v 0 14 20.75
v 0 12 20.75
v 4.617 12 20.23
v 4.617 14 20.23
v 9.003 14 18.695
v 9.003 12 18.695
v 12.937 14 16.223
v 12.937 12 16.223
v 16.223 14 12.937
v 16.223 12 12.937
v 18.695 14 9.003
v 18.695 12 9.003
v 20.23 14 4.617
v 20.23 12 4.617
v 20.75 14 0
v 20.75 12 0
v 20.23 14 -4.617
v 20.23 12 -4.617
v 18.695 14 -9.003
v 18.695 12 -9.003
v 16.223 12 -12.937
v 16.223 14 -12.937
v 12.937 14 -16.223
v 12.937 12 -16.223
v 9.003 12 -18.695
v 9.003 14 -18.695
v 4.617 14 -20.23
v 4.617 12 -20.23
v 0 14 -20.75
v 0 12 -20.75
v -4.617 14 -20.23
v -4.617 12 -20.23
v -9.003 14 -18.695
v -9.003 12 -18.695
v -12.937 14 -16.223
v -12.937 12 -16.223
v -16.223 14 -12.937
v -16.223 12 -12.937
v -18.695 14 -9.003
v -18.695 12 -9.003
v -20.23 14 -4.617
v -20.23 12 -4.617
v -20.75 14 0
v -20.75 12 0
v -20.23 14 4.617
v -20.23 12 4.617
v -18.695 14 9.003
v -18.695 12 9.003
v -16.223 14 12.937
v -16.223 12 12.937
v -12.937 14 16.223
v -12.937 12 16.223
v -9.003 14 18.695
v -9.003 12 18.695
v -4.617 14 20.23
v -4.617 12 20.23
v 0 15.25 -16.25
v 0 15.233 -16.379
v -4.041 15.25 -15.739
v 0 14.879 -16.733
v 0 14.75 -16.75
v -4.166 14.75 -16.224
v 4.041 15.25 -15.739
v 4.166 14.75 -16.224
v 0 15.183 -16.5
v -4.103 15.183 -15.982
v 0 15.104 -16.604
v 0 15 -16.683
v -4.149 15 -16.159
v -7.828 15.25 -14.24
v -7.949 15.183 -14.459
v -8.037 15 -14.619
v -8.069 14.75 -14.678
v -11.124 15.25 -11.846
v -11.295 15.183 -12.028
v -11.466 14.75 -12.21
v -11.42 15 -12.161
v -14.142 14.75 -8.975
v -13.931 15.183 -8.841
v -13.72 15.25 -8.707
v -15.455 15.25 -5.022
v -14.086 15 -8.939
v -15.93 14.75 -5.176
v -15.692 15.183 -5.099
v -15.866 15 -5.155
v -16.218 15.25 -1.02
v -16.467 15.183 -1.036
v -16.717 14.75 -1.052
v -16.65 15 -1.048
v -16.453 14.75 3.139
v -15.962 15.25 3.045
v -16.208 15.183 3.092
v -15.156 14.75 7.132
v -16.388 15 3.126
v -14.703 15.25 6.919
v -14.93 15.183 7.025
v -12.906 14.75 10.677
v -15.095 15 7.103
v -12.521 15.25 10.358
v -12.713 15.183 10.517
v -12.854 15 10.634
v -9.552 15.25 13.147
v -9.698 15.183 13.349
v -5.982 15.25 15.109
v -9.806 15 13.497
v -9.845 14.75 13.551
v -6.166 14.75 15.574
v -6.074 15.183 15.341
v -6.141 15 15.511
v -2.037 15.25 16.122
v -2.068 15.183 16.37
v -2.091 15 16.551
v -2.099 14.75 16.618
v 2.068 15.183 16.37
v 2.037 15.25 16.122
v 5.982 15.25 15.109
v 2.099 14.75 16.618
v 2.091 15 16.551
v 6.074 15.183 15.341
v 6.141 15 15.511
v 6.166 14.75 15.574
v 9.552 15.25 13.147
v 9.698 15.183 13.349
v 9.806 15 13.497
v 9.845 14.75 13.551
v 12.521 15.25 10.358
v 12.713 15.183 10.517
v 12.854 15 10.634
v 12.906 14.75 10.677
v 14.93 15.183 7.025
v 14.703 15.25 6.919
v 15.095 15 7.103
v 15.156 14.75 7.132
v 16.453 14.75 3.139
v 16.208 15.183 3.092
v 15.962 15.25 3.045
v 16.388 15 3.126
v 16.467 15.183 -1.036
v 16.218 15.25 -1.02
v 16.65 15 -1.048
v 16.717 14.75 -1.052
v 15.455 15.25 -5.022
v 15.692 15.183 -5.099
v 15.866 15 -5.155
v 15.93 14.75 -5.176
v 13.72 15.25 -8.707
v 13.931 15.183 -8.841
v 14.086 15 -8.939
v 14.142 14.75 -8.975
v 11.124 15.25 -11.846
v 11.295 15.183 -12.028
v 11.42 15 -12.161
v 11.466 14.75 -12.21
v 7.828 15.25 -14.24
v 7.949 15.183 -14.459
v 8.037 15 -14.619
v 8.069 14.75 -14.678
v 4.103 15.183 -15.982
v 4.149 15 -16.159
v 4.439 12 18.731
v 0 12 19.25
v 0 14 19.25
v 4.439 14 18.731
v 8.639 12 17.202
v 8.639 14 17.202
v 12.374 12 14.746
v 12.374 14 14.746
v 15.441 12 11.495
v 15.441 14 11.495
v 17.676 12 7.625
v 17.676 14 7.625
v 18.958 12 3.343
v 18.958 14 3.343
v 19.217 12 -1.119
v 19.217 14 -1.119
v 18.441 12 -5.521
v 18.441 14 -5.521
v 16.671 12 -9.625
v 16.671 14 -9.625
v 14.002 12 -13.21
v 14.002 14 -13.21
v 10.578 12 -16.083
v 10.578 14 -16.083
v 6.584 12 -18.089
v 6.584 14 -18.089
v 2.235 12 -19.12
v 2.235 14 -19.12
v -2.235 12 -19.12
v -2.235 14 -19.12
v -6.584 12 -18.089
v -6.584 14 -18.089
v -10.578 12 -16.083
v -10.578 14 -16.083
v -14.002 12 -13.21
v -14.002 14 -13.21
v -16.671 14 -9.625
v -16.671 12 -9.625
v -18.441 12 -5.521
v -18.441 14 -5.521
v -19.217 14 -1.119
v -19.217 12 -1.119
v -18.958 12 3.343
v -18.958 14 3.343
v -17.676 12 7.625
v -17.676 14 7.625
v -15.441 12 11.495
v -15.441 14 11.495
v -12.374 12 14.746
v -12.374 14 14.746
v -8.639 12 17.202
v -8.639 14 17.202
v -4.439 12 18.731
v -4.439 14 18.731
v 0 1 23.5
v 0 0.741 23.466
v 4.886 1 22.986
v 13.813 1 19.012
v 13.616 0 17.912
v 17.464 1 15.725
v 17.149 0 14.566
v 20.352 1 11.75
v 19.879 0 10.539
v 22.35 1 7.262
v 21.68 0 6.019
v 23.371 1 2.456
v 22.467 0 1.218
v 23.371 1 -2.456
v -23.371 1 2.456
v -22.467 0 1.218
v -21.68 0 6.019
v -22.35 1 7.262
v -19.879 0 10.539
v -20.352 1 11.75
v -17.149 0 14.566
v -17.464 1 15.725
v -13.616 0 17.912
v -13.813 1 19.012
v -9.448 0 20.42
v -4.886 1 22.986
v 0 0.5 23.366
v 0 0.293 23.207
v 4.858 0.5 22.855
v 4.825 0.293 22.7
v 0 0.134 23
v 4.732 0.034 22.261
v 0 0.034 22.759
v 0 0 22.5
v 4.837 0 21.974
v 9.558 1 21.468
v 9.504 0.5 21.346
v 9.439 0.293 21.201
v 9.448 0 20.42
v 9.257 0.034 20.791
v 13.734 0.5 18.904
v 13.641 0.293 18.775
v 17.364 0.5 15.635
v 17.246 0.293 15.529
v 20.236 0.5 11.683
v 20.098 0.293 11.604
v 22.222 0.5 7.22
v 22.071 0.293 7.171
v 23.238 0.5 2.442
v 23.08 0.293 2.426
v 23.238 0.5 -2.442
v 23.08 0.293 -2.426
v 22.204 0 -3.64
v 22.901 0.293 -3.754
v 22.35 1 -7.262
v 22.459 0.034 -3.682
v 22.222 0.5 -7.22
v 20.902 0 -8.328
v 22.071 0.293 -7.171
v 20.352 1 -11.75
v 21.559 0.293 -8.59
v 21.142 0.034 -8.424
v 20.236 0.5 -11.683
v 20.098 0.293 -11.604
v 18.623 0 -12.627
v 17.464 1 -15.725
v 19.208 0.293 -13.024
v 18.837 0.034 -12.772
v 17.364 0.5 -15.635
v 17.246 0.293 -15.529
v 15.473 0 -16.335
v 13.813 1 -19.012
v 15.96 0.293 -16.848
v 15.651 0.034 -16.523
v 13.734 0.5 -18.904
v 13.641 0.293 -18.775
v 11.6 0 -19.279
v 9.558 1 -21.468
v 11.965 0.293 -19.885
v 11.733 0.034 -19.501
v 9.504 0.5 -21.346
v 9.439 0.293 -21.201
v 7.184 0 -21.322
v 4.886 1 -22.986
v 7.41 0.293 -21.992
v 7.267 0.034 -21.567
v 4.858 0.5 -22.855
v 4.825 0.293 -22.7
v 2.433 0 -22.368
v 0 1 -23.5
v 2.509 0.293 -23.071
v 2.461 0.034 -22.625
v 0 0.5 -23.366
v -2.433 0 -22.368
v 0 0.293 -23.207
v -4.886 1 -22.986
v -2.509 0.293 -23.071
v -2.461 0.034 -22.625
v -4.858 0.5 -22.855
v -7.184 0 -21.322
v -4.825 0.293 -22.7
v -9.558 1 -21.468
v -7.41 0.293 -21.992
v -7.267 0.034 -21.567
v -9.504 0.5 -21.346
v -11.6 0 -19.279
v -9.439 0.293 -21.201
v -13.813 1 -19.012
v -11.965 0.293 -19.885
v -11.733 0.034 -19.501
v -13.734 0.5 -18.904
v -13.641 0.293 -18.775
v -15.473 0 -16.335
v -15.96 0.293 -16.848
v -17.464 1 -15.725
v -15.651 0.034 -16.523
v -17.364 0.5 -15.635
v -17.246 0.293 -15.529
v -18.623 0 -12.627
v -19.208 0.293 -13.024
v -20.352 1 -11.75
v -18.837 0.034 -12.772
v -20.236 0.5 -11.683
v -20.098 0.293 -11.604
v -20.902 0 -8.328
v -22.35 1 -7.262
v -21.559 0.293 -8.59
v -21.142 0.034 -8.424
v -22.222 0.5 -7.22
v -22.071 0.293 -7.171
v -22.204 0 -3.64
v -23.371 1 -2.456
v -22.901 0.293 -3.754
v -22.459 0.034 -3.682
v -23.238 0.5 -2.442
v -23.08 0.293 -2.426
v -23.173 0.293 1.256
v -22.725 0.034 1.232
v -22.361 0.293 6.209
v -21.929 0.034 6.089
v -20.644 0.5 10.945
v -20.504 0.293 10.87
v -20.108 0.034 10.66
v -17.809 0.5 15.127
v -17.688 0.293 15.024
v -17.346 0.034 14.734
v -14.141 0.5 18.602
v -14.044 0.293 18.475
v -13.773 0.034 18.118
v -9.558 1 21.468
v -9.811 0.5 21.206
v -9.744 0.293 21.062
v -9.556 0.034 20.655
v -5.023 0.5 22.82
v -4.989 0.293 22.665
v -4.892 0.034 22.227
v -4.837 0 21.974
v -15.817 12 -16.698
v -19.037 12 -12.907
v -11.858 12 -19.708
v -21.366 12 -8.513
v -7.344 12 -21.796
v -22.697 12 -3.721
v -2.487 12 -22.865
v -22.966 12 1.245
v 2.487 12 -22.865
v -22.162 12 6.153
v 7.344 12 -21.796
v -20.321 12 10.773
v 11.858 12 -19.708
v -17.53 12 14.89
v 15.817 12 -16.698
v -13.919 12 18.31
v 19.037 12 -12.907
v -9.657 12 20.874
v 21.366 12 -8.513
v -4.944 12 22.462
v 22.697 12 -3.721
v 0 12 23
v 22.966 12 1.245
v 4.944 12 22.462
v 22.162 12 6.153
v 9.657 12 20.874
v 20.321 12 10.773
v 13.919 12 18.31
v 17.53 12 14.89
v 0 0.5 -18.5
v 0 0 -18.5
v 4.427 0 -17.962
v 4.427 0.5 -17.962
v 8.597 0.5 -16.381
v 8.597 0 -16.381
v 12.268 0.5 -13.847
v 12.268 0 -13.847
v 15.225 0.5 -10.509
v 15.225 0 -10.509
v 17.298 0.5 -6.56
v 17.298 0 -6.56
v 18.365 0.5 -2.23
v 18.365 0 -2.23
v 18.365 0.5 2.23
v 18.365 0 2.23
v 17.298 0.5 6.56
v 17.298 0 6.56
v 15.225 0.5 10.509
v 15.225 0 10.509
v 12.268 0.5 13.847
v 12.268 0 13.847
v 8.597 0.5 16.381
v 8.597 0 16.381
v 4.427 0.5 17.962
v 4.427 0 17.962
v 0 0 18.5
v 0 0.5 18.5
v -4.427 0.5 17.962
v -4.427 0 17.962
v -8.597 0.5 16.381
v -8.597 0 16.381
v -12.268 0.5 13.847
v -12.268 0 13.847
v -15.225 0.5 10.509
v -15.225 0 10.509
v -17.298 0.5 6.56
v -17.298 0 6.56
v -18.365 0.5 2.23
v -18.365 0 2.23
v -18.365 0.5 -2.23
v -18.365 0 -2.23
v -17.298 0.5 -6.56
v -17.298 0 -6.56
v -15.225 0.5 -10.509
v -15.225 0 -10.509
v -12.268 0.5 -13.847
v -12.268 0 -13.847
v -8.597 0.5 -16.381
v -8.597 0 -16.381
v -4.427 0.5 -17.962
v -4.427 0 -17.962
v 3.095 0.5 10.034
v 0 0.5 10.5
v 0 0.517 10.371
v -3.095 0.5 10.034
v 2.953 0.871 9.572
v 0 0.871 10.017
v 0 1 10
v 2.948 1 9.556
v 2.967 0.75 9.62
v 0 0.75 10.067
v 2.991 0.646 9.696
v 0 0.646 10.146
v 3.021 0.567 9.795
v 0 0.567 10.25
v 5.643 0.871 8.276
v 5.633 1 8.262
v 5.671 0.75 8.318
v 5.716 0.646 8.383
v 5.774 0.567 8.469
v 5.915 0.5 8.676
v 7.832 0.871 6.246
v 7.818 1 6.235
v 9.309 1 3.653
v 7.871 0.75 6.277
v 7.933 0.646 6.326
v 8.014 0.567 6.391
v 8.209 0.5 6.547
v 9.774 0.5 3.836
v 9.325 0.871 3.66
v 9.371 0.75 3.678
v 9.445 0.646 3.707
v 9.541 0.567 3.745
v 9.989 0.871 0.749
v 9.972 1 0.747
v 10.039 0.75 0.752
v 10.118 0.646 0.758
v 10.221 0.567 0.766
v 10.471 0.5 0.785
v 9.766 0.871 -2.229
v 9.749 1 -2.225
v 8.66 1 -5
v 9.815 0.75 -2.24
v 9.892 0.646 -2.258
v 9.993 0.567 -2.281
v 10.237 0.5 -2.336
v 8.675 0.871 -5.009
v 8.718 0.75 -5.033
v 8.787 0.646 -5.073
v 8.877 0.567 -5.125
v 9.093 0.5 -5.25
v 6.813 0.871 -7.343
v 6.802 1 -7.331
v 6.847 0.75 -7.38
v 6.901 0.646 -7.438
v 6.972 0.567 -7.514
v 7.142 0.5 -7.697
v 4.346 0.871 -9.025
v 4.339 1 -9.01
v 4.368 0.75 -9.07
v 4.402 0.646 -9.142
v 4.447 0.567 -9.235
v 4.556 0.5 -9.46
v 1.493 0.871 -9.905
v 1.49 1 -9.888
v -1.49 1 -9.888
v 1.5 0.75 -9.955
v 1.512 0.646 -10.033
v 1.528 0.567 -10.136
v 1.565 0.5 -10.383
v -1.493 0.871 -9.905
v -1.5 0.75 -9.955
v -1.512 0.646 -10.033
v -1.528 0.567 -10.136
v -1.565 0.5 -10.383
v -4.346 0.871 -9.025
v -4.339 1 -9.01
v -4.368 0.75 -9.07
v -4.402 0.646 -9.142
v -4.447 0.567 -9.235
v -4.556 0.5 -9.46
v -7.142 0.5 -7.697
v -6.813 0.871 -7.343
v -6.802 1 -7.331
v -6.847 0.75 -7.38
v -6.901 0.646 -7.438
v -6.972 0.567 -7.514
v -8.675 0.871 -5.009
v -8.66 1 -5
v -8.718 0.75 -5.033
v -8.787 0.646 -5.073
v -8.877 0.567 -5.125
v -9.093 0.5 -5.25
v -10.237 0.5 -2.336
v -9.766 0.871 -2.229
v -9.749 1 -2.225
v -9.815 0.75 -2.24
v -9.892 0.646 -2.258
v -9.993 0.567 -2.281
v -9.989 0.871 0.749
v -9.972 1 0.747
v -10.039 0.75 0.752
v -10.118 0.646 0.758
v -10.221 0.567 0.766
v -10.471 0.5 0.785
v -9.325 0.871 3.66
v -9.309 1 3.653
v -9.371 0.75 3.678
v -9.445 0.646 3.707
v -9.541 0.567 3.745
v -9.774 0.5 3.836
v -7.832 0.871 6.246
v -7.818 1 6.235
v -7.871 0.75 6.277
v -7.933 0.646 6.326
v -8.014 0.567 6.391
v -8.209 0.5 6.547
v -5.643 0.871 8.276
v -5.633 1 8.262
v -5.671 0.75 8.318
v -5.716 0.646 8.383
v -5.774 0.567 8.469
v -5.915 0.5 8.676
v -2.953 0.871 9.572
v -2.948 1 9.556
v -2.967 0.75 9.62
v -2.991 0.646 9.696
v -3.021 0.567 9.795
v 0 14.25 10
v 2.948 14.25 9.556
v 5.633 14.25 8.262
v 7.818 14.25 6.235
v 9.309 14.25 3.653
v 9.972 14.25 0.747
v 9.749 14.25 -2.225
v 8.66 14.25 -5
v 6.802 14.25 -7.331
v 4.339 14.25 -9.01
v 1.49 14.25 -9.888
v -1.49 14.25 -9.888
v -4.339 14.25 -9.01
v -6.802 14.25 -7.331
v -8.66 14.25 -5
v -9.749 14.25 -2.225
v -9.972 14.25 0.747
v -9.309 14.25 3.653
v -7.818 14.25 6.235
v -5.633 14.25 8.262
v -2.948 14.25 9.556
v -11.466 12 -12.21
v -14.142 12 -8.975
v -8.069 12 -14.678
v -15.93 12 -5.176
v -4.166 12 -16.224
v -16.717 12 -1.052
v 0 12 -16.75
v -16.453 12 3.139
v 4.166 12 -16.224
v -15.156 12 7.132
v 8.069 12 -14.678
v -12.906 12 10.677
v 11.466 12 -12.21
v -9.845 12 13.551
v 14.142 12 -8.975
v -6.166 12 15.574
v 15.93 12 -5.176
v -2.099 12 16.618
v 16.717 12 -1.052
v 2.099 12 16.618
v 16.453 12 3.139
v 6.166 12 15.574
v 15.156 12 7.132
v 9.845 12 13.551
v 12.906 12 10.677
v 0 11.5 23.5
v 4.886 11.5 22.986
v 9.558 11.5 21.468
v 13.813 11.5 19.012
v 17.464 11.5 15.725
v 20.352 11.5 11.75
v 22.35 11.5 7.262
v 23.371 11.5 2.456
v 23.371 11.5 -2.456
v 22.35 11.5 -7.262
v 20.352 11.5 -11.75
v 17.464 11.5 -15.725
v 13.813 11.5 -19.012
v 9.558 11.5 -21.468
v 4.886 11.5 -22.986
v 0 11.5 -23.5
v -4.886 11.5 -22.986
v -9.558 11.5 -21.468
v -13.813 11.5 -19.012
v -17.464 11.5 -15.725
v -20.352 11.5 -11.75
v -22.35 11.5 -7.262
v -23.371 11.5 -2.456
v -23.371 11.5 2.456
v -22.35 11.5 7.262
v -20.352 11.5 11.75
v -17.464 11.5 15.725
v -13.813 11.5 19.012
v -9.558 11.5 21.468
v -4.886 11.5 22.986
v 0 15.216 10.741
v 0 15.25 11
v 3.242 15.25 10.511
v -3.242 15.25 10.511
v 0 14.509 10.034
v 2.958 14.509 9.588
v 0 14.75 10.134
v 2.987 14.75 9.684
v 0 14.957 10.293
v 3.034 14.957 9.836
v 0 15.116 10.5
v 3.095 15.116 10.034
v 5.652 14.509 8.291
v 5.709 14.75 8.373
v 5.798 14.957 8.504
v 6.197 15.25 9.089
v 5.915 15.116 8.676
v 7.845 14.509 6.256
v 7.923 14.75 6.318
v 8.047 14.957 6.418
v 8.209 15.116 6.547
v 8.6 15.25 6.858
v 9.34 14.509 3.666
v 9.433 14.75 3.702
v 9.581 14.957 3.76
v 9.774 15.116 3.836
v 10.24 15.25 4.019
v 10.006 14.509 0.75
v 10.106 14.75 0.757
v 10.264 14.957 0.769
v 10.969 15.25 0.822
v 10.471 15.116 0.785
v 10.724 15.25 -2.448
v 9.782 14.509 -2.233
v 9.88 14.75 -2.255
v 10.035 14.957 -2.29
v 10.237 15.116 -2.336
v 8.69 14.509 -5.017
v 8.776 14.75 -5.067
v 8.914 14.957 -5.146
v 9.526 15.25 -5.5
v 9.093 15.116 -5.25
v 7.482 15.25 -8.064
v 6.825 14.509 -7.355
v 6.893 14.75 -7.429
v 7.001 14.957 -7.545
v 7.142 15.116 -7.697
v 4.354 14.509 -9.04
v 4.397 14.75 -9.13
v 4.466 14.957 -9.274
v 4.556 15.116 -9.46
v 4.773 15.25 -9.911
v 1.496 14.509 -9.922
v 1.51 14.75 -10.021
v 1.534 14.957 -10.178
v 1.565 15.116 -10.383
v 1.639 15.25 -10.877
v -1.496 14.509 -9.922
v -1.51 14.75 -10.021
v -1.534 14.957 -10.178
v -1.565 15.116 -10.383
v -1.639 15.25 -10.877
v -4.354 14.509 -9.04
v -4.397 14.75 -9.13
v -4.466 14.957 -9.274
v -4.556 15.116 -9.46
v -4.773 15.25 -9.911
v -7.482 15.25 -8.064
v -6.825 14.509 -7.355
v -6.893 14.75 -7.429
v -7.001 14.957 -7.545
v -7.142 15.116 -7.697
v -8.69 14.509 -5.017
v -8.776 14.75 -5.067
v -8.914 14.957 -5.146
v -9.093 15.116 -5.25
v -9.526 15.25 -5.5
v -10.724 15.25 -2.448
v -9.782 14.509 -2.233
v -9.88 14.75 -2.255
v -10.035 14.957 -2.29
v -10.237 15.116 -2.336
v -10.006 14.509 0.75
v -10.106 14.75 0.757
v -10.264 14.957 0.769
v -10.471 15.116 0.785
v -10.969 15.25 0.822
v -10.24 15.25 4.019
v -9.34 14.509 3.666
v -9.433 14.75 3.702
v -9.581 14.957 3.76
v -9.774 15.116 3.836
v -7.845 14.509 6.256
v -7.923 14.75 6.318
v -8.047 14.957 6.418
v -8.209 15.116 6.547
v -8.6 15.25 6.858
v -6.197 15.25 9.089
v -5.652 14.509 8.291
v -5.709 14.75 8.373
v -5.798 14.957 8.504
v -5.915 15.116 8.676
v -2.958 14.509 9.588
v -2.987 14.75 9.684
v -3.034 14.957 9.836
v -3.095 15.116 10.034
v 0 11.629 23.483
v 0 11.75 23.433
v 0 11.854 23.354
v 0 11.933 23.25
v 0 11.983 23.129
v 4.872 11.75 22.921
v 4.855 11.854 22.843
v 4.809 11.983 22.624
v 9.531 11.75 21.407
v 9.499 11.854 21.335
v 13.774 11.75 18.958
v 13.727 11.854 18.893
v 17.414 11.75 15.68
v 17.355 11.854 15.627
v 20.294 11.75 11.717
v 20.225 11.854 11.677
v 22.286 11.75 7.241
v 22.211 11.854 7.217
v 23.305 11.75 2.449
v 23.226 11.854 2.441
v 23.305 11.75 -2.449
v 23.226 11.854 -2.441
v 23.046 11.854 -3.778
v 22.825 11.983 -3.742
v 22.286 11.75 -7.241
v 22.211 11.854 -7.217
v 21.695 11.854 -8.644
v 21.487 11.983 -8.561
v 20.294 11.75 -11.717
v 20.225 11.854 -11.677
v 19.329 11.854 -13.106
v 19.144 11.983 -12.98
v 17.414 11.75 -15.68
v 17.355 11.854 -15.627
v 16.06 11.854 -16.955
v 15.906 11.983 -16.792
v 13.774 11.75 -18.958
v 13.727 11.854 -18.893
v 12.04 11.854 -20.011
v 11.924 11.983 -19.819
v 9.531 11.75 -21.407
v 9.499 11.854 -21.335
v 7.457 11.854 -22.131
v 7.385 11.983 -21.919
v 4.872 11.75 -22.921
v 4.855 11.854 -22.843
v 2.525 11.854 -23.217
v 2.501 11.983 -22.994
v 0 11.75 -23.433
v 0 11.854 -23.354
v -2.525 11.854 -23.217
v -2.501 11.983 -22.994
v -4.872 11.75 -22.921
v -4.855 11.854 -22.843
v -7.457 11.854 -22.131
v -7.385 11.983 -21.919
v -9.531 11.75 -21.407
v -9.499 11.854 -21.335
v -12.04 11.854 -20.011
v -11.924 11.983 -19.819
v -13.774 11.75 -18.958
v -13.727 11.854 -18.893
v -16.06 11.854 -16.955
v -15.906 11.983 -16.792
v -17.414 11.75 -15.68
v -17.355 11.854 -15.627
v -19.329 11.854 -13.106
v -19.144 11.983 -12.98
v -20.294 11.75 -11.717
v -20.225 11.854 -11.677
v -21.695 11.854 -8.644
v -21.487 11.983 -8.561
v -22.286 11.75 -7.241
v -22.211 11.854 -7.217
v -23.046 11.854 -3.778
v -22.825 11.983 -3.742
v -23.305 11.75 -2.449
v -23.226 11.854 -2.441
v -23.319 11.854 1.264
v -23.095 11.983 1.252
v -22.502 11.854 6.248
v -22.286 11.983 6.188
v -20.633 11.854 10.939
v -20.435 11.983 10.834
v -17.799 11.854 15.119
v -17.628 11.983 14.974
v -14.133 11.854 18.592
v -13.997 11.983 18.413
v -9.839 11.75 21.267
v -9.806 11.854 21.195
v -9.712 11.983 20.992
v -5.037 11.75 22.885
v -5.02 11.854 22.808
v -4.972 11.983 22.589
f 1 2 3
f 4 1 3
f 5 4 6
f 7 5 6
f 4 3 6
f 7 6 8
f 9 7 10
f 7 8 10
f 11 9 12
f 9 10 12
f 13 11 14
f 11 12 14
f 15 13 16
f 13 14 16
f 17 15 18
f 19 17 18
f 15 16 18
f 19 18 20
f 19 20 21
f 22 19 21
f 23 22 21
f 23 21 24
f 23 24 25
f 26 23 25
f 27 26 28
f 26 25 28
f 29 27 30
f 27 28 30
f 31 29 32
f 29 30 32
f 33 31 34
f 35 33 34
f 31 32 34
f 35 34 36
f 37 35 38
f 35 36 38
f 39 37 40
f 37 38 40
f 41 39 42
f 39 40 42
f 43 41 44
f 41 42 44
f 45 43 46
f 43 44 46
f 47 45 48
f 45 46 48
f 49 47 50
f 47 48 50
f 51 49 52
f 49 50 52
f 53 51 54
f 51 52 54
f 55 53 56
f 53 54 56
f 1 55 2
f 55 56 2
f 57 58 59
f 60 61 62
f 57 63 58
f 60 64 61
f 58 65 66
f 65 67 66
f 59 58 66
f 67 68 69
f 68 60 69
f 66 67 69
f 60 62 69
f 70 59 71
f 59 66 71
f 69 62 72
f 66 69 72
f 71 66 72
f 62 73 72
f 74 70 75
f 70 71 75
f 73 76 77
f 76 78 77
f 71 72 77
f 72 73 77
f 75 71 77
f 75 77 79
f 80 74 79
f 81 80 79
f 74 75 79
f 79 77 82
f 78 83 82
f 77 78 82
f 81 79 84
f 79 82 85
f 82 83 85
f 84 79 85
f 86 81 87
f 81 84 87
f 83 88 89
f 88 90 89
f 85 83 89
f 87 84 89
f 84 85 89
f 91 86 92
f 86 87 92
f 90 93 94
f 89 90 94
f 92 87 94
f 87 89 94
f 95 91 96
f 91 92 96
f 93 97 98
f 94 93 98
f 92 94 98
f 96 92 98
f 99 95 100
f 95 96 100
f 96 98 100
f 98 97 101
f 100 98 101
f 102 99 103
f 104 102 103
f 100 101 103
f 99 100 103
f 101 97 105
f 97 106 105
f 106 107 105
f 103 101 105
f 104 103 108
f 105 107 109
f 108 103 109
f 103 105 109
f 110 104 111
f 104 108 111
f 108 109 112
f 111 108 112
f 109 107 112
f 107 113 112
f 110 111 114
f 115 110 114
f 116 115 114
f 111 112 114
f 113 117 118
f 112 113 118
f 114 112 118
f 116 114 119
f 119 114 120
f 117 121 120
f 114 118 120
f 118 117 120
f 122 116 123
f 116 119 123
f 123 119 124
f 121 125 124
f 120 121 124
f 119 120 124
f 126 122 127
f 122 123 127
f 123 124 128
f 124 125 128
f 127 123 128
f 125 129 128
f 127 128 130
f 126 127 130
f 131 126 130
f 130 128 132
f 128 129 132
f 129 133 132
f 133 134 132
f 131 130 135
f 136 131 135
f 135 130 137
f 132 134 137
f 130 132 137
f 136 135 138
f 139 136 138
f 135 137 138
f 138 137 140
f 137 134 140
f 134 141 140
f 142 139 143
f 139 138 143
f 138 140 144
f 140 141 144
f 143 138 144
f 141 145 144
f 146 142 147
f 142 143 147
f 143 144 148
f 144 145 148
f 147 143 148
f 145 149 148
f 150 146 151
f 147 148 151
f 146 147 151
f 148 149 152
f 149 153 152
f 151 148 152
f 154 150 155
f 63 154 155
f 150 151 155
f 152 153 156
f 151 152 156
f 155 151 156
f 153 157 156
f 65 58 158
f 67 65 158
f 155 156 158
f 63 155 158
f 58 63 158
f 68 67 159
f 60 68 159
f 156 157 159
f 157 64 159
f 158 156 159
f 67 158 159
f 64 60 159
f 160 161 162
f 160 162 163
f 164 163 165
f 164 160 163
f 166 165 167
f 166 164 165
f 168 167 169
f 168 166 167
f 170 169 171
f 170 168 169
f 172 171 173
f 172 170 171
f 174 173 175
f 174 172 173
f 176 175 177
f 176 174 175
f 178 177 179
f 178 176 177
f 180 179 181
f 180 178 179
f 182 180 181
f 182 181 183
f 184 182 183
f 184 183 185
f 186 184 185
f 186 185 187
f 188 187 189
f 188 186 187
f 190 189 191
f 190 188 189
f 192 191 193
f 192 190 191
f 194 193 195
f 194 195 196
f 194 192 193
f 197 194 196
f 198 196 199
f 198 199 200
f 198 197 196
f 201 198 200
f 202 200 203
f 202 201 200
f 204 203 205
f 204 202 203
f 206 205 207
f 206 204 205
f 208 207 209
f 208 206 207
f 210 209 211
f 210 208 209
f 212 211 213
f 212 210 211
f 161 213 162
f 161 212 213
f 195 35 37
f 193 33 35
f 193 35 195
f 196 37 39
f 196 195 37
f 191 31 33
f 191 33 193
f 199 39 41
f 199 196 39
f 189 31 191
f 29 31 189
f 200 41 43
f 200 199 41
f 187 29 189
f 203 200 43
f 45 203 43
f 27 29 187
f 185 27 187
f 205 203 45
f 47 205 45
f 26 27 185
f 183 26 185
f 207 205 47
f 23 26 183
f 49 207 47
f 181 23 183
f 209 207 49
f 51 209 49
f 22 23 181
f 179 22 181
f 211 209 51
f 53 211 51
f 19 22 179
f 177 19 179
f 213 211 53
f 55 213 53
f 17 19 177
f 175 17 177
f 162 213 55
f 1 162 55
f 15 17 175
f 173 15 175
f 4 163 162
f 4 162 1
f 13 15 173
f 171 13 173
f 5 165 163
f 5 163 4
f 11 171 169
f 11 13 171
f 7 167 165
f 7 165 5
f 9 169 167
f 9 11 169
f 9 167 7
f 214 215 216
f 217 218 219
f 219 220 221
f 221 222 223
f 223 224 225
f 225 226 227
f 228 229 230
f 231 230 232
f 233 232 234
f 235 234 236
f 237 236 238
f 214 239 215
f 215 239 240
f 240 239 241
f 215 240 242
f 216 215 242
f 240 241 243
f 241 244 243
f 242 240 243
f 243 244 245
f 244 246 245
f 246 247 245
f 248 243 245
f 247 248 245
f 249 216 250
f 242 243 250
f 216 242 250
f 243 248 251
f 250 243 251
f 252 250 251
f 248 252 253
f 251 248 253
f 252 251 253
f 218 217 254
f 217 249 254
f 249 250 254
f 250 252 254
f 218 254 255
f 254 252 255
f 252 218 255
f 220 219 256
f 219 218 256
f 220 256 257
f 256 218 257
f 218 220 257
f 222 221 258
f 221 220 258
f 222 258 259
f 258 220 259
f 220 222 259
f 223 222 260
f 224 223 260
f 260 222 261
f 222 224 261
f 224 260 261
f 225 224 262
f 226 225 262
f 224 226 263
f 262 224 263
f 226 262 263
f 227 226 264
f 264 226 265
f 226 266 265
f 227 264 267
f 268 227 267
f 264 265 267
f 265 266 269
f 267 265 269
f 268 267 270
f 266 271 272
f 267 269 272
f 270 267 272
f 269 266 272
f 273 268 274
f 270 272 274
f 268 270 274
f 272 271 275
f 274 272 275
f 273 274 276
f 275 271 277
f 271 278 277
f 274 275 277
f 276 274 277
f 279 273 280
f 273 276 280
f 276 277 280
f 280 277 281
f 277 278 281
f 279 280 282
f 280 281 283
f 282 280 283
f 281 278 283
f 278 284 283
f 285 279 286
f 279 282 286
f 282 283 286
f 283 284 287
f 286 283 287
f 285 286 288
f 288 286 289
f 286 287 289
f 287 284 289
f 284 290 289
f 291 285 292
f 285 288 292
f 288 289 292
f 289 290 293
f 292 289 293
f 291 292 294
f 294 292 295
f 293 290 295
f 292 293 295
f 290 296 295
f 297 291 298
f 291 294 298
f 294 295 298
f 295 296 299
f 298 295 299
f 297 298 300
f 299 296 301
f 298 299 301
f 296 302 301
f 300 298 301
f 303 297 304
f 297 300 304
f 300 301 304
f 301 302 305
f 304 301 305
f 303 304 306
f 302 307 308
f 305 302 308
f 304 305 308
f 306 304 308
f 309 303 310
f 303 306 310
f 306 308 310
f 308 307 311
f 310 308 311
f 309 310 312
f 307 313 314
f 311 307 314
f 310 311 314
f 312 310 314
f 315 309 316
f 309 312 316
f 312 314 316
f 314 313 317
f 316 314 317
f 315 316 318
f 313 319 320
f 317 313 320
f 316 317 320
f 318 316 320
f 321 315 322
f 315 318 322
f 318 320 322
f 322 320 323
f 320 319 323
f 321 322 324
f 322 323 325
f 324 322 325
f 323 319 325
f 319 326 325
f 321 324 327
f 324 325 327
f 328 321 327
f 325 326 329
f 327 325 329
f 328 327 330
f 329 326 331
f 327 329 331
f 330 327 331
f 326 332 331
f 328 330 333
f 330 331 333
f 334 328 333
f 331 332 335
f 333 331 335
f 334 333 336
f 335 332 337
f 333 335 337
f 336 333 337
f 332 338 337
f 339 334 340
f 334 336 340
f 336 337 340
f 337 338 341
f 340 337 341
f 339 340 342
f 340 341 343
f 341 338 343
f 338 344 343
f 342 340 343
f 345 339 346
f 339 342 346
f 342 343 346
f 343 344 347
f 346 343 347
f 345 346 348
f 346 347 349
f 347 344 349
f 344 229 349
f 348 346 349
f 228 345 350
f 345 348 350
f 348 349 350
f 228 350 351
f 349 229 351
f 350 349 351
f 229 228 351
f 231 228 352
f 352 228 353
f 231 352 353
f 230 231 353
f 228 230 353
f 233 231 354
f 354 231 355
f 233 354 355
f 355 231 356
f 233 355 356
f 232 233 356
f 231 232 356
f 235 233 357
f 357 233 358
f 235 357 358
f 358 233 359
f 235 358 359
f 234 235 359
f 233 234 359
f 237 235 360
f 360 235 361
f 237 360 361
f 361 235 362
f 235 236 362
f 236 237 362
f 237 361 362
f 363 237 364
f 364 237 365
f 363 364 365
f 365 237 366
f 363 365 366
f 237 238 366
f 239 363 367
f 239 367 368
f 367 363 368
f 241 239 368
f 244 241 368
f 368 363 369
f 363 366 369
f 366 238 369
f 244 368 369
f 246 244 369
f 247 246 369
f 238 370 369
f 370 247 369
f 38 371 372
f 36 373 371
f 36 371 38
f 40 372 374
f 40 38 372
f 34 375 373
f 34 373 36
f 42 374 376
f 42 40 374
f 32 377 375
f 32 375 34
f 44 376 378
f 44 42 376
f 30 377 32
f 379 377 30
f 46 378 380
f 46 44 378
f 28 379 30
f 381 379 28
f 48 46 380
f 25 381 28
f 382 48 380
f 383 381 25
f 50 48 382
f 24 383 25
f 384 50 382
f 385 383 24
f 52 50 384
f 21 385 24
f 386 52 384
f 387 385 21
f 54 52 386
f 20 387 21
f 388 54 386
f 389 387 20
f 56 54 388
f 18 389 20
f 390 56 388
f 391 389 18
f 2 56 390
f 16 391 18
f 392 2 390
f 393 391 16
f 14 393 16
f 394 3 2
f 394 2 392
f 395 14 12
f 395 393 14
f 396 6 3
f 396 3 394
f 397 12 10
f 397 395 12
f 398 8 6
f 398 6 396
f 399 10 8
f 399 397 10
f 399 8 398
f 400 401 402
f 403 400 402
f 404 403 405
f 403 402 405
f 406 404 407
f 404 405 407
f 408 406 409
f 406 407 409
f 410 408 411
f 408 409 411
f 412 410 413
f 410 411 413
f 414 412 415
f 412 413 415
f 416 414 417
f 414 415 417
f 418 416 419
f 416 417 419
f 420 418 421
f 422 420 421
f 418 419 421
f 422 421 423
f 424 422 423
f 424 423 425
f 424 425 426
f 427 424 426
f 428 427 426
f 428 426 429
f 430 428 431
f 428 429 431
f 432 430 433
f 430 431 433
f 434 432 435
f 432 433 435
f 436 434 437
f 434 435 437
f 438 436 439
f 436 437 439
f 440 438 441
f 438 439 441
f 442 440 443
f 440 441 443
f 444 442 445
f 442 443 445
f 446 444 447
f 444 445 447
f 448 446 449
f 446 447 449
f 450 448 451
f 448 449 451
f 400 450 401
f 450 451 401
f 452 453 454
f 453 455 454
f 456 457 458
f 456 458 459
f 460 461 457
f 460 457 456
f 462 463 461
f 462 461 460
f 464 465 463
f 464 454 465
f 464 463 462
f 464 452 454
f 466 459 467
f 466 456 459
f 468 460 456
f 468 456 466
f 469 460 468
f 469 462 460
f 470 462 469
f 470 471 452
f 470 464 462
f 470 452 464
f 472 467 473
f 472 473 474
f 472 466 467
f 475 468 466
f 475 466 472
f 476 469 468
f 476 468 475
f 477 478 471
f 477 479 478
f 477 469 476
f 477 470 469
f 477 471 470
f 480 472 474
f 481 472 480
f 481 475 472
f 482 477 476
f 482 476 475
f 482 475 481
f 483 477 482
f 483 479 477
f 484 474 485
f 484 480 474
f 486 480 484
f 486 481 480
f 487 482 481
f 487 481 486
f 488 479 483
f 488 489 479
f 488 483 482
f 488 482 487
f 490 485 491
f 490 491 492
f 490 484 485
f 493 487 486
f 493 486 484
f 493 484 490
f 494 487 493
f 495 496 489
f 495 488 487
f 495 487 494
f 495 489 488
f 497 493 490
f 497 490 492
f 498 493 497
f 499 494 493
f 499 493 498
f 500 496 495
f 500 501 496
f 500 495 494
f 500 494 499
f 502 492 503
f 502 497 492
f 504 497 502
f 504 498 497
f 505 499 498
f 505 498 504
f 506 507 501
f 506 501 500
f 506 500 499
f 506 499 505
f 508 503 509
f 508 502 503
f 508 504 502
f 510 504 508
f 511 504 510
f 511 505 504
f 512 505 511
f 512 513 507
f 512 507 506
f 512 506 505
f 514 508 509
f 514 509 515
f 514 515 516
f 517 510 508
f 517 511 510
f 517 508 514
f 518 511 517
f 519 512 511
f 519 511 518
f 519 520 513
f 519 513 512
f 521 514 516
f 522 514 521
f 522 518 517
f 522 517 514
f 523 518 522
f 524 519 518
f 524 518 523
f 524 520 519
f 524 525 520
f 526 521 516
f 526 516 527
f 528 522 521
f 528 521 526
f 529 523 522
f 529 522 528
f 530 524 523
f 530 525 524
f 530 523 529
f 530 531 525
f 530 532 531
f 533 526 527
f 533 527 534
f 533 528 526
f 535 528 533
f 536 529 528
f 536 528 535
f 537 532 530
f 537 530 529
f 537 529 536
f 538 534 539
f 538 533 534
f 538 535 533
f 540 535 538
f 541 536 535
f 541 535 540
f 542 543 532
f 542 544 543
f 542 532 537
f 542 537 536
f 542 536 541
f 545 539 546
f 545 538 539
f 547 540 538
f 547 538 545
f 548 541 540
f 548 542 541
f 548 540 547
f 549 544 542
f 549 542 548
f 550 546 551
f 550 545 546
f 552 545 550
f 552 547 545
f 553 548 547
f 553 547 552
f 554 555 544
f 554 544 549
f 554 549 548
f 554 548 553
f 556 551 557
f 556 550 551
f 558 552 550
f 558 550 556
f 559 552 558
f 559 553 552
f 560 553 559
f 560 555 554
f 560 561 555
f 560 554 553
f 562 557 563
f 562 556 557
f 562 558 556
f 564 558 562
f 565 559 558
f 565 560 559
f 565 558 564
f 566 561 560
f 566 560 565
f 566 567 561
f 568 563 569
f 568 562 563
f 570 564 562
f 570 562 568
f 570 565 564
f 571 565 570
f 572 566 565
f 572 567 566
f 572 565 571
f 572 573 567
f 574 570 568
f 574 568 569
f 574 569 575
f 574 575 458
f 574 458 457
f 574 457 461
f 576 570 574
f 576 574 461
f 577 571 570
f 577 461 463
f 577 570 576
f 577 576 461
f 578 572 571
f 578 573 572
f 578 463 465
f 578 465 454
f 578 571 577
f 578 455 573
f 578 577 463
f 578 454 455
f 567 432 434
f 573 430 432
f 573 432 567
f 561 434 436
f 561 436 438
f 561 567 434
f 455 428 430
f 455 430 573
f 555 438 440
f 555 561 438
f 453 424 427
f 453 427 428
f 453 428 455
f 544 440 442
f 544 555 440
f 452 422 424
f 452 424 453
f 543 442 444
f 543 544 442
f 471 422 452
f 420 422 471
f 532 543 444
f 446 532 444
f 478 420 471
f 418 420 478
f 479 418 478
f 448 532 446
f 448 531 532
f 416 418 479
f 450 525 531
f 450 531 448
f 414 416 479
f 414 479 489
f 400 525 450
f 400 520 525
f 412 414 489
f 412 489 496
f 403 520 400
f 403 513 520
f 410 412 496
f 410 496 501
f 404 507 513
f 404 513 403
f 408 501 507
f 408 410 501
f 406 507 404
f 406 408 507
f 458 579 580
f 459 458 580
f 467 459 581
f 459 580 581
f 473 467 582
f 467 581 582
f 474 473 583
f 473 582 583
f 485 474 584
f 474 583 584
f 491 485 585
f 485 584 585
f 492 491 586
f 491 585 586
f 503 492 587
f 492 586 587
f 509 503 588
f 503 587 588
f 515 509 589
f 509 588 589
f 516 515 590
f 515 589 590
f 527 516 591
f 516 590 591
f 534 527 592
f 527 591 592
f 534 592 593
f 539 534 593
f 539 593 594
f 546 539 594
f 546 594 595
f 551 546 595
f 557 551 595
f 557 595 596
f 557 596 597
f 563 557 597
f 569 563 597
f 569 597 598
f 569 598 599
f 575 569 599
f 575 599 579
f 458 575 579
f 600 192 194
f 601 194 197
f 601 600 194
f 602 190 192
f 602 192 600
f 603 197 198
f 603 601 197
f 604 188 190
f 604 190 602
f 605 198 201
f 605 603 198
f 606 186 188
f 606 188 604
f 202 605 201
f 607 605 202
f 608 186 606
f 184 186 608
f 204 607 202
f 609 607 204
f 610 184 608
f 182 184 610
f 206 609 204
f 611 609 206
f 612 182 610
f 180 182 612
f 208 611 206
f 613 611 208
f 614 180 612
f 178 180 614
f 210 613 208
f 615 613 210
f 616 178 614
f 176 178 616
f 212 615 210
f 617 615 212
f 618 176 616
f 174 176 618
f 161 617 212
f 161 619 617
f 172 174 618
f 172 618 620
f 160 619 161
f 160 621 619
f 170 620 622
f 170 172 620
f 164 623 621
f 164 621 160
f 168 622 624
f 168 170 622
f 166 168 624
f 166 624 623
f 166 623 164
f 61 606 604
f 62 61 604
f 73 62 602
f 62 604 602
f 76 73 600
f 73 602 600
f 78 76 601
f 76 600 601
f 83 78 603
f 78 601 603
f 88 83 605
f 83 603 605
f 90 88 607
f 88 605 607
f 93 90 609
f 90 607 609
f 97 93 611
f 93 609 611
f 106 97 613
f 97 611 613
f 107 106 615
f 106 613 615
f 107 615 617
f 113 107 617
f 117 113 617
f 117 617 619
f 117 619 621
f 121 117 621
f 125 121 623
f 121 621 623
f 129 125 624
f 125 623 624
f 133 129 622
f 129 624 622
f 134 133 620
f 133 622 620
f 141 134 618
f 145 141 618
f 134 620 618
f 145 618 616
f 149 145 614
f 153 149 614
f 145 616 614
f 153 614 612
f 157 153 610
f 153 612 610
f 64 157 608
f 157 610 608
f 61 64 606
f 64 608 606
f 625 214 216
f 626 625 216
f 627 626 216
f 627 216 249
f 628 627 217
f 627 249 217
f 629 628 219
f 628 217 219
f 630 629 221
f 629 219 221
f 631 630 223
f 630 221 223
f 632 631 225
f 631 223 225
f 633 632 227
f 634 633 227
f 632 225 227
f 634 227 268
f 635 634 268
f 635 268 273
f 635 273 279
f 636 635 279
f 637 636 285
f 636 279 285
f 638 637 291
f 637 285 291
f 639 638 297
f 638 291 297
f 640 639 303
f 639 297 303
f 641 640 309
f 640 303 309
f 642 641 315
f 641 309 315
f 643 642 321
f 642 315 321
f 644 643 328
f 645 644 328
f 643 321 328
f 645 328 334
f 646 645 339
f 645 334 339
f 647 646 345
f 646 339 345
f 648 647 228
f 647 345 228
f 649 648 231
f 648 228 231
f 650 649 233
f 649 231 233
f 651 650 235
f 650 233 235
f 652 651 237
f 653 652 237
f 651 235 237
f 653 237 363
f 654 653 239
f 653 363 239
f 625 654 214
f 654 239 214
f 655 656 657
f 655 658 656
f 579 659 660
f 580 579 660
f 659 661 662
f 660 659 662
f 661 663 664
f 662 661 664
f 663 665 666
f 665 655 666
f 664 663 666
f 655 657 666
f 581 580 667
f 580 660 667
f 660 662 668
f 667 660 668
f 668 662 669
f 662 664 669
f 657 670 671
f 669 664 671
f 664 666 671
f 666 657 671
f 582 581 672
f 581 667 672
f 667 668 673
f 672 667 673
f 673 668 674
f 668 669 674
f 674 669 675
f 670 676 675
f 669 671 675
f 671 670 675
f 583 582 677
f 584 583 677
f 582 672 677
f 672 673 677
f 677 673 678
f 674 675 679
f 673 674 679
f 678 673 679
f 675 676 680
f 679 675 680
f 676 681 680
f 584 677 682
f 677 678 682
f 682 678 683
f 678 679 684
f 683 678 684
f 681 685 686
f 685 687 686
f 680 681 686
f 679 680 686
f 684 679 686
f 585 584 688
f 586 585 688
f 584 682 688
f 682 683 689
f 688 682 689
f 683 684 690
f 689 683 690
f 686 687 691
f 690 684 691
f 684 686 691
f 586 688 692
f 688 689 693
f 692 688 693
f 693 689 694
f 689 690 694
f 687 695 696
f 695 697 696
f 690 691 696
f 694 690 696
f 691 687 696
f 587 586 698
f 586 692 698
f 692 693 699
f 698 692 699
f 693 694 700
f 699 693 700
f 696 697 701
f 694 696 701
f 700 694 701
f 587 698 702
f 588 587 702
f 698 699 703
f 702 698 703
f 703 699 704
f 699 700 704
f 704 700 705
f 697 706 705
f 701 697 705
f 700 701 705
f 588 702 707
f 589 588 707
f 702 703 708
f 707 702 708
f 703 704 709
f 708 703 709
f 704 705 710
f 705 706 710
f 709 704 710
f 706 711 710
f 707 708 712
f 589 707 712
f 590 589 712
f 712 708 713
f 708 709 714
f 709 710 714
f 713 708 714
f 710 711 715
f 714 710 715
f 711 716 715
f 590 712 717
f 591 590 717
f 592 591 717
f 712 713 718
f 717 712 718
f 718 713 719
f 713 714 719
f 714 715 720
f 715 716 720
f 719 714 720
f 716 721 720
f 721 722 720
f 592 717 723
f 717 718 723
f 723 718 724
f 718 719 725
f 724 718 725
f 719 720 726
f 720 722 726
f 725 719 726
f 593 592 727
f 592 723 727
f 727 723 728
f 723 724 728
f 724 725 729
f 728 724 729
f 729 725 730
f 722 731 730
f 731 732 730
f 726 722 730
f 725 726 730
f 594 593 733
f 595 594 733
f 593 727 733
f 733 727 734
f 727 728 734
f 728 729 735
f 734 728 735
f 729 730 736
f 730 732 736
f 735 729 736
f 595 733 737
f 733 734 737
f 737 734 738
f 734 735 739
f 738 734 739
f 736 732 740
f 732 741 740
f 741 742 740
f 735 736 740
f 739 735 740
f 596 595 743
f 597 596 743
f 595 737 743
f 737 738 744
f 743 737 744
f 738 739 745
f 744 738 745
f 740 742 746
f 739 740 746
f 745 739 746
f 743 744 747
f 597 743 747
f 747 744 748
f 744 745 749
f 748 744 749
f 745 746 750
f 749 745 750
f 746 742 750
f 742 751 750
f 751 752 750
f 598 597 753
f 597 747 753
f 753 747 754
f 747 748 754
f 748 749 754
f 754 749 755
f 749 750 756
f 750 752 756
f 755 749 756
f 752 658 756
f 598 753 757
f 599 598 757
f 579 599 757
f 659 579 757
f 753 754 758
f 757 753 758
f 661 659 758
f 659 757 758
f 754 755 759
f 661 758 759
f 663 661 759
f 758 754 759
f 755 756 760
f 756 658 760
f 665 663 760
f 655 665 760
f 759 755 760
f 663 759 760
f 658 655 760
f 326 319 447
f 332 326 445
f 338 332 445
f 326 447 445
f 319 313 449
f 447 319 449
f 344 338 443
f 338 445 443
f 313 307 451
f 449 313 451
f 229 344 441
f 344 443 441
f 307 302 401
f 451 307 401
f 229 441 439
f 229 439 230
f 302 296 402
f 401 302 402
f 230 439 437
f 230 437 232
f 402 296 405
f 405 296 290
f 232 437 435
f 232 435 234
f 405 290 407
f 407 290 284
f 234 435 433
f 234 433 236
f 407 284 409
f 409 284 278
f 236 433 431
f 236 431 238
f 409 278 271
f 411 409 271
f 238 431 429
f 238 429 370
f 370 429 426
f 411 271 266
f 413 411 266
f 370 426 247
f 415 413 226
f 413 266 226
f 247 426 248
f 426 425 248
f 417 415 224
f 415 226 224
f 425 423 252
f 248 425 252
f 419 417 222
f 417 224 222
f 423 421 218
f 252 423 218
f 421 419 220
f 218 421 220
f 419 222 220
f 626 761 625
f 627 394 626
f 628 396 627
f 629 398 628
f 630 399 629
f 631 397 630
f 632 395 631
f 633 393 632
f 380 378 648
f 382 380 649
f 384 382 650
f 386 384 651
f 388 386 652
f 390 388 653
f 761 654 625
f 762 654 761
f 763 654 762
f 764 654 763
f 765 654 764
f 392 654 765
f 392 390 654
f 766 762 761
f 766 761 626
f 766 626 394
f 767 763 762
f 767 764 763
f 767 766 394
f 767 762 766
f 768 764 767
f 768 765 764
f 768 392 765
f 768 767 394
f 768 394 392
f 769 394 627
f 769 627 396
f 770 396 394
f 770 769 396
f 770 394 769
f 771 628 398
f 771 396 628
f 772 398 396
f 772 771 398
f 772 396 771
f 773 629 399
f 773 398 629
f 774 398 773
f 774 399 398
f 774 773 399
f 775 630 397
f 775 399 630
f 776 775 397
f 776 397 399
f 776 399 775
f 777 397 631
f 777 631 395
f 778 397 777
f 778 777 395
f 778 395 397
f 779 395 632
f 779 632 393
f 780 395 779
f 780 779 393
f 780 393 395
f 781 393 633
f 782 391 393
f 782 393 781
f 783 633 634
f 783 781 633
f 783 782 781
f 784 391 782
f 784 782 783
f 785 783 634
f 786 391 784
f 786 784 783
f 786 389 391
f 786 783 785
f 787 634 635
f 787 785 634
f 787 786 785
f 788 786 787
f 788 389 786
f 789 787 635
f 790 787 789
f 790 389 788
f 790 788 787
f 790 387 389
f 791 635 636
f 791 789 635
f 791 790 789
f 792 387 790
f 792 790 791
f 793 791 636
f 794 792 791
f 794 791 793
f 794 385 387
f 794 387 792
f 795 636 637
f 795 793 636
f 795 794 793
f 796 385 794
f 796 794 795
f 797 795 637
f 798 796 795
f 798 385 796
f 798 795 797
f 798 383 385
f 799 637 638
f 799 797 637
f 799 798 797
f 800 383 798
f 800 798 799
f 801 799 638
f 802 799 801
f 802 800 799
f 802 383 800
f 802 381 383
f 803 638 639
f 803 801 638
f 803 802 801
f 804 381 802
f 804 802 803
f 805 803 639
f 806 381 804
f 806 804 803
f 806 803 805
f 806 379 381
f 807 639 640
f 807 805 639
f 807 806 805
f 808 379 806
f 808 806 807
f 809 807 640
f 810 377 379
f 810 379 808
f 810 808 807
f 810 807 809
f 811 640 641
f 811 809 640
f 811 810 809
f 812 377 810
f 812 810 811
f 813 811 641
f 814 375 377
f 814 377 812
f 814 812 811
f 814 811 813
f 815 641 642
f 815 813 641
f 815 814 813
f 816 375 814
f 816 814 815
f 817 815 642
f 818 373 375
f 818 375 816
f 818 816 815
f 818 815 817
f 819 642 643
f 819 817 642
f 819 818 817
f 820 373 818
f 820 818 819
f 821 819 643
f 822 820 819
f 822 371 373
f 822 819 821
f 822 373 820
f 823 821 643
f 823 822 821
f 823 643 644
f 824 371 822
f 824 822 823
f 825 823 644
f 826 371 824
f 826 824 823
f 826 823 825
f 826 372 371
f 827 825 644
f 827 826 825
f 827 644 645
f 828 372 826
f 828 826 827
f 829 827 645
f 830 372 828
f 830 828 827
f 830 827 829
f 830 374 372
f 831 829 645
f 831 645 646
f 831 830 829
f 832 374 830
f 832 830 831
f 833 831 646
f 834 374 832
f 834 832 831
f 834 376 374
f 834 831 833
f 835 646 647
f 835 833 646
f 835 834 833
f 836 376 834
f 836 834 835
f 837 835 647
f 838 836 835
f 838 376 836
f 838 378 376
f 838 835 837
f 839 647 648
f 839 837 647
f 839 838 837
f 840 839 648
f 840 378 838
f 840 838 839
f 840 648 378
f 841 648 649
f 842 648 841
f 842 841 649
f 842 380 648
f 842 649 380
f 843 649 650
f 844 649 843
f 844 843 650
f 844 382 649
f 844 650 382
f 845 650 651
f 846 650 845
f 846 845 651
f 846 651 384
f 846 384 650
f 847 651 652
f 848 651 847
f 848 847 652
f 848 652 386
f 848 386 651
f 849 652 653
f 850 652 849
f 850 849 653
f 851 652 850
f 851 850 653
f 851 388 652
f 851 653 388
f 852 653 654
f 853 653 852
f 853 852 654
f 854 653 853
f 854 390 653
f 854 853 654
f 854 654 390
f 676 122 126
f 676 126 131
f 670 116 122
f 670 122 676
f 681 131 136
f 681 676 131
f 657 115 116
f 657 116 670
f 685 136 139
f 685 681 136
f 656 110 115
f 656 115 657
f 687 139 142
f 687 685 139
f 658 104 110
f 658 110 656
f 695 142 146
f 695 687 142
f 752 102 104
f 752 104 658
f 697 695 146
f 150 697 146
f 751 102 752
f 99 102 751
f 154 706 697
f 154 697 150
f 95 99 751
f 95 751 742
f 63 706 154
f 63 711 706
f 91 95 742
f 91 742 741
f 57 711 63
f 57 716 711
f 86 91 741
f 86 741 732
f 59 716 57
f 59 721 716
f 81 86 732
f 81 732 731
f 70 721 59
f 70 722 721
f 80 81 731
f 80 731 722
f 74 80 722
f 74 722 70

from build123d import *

# Parameters (mm, degrees)
SKETCH1_R           = 23.5
BOSS_EXTRUDE1_DEPTH = 12
SKETCH2_R           = 16.75
BOSS_EXTRUDE2_DEPTH = 3.25
SKETCH3_R           = 10
CUT_EXTRUDE1_DEPTH  = 37.56586523
SKETCH5_R           = 20.75
SKETCH5_R_2         = 19.25
BOSS_EXTRUDE3_DEPTH = 2
FILLET1_R           = 1
FILLET2_R           = 1
FILLET3_R           = 0.5
FILLET4_R           = 0.5
SKETCH6_R           = 18.5
CUT_EXTRUDE2_DEPTH  = 0.5
FILLET5_R           = 0.5


with BuildPart() as part:
    # Sketch1 → Boss-Extrude1 (new body)
    with BuildSketch(Plane(origin=(0, 0, 0), x_dir=(1, 0, 0), z_dir=(0, 1, 0))):
        with Locations(Location((0, 0, 0), (0, 0, 270))):
            Circle(SKETCH1_R)
    extrude(amount=BOSS_EXTRUDE1_DEPTH)

    # Sketch2 → Boss-Extrude2 (add)
    with BuildSketch(Plane(origin=(0, 12, 0), x_dir=(1, 0, 0), z_dir=(0, 1, 0))):
        with Locations(Location((0, 0, 0), (0, 0, 90))):
            Circle(SKETCH2_R)
    extrude(amount=BOSS_EXTRUDE2_DEPTH)

    # Sketch3 → Cut-Extrude1 (cut, through all)
    with BuildSketch(Plane(origin=(0, 15.25, 0), x_dir=(1, 0, 0), z_dir=(0, 1, 0))):
        with Locations(Location((0, 0, 0), (0, 0, 270))):
            Circle(SKETCH3_R)
    extrude(amount=-CUT_EXTRUDE1_DEPTH, mode=Mode.SUBTRACT)

    # Sketch5 → Boss-Extrude3 (add)
    with BuildSketch(Plane(origin=(0, 12, 0), x_dir=(1, 0, 0), z_dir=(0, 1, 0))):
        with Locations(Location((0, 0, 0), (0, 0, 270))):
            Circle(SKETCH5_R)
        with Locations(Location((0, 0, 0), (0, 0, 270))):
            Circle(SKETCH5_R_2, mode=Mode.SUBTRACT)
    extrude(amount=BOSS_EXTRUDE3_DEPTH)

    # Fillet1
    fillet1_edges = [part.edges().sort_by_distance(p)[0] for p in [
        (0, 0, -23.5),
    ]]
    fillet(fillet1_edges, radius=FILLET1_R)

    # Fillet2
    fillet2_edges = [part.edges().sort_by_distance(p)[0] for p in [
        (0, 15.25, -10),
    ]]
    fillet(fillet2_edges, radius=FILLET2_R)

    # Fillet3
    fillet3_edges = [part.edges().sort_by_distance(p)[0] for p in [
        (0, 15.25, 16.75),
    ]]
    fillet(fillet3_edges, radius=FILLET3_R)

    # Fillet4
    fillet4_edges = [part.edges().sort_by_distance(p)[0] for p in [
        (0, 0, -10),
        (0, 12, -23.5),
    ]]
    fillet(fillet4_edges, radius=FILLET4_R)

    # Sketch6 → Cut-Extrude2 (cut)
    with BuildSketch(Plane(origin=(0, 0, 0), x_dir=(-1, 0, 0), z_dir=(0, -1, 0))):
        with Locations(Location((0, 0, 0), (0, 0, 90))):
            Circle(SKETCH6_R)
    extrude(amount=-CUT_EXTRUDE2_DEPTH, mode=Mode.SUBTRACT)

    # Fillet5
    fillet5_edges = [part.edges().sort_by_distance(p)[0] for p in [
        (0, 0.5, -10),
    ]]
    fillet(fillet5_edges, radius=FILLET5_R)


solid = part.part
